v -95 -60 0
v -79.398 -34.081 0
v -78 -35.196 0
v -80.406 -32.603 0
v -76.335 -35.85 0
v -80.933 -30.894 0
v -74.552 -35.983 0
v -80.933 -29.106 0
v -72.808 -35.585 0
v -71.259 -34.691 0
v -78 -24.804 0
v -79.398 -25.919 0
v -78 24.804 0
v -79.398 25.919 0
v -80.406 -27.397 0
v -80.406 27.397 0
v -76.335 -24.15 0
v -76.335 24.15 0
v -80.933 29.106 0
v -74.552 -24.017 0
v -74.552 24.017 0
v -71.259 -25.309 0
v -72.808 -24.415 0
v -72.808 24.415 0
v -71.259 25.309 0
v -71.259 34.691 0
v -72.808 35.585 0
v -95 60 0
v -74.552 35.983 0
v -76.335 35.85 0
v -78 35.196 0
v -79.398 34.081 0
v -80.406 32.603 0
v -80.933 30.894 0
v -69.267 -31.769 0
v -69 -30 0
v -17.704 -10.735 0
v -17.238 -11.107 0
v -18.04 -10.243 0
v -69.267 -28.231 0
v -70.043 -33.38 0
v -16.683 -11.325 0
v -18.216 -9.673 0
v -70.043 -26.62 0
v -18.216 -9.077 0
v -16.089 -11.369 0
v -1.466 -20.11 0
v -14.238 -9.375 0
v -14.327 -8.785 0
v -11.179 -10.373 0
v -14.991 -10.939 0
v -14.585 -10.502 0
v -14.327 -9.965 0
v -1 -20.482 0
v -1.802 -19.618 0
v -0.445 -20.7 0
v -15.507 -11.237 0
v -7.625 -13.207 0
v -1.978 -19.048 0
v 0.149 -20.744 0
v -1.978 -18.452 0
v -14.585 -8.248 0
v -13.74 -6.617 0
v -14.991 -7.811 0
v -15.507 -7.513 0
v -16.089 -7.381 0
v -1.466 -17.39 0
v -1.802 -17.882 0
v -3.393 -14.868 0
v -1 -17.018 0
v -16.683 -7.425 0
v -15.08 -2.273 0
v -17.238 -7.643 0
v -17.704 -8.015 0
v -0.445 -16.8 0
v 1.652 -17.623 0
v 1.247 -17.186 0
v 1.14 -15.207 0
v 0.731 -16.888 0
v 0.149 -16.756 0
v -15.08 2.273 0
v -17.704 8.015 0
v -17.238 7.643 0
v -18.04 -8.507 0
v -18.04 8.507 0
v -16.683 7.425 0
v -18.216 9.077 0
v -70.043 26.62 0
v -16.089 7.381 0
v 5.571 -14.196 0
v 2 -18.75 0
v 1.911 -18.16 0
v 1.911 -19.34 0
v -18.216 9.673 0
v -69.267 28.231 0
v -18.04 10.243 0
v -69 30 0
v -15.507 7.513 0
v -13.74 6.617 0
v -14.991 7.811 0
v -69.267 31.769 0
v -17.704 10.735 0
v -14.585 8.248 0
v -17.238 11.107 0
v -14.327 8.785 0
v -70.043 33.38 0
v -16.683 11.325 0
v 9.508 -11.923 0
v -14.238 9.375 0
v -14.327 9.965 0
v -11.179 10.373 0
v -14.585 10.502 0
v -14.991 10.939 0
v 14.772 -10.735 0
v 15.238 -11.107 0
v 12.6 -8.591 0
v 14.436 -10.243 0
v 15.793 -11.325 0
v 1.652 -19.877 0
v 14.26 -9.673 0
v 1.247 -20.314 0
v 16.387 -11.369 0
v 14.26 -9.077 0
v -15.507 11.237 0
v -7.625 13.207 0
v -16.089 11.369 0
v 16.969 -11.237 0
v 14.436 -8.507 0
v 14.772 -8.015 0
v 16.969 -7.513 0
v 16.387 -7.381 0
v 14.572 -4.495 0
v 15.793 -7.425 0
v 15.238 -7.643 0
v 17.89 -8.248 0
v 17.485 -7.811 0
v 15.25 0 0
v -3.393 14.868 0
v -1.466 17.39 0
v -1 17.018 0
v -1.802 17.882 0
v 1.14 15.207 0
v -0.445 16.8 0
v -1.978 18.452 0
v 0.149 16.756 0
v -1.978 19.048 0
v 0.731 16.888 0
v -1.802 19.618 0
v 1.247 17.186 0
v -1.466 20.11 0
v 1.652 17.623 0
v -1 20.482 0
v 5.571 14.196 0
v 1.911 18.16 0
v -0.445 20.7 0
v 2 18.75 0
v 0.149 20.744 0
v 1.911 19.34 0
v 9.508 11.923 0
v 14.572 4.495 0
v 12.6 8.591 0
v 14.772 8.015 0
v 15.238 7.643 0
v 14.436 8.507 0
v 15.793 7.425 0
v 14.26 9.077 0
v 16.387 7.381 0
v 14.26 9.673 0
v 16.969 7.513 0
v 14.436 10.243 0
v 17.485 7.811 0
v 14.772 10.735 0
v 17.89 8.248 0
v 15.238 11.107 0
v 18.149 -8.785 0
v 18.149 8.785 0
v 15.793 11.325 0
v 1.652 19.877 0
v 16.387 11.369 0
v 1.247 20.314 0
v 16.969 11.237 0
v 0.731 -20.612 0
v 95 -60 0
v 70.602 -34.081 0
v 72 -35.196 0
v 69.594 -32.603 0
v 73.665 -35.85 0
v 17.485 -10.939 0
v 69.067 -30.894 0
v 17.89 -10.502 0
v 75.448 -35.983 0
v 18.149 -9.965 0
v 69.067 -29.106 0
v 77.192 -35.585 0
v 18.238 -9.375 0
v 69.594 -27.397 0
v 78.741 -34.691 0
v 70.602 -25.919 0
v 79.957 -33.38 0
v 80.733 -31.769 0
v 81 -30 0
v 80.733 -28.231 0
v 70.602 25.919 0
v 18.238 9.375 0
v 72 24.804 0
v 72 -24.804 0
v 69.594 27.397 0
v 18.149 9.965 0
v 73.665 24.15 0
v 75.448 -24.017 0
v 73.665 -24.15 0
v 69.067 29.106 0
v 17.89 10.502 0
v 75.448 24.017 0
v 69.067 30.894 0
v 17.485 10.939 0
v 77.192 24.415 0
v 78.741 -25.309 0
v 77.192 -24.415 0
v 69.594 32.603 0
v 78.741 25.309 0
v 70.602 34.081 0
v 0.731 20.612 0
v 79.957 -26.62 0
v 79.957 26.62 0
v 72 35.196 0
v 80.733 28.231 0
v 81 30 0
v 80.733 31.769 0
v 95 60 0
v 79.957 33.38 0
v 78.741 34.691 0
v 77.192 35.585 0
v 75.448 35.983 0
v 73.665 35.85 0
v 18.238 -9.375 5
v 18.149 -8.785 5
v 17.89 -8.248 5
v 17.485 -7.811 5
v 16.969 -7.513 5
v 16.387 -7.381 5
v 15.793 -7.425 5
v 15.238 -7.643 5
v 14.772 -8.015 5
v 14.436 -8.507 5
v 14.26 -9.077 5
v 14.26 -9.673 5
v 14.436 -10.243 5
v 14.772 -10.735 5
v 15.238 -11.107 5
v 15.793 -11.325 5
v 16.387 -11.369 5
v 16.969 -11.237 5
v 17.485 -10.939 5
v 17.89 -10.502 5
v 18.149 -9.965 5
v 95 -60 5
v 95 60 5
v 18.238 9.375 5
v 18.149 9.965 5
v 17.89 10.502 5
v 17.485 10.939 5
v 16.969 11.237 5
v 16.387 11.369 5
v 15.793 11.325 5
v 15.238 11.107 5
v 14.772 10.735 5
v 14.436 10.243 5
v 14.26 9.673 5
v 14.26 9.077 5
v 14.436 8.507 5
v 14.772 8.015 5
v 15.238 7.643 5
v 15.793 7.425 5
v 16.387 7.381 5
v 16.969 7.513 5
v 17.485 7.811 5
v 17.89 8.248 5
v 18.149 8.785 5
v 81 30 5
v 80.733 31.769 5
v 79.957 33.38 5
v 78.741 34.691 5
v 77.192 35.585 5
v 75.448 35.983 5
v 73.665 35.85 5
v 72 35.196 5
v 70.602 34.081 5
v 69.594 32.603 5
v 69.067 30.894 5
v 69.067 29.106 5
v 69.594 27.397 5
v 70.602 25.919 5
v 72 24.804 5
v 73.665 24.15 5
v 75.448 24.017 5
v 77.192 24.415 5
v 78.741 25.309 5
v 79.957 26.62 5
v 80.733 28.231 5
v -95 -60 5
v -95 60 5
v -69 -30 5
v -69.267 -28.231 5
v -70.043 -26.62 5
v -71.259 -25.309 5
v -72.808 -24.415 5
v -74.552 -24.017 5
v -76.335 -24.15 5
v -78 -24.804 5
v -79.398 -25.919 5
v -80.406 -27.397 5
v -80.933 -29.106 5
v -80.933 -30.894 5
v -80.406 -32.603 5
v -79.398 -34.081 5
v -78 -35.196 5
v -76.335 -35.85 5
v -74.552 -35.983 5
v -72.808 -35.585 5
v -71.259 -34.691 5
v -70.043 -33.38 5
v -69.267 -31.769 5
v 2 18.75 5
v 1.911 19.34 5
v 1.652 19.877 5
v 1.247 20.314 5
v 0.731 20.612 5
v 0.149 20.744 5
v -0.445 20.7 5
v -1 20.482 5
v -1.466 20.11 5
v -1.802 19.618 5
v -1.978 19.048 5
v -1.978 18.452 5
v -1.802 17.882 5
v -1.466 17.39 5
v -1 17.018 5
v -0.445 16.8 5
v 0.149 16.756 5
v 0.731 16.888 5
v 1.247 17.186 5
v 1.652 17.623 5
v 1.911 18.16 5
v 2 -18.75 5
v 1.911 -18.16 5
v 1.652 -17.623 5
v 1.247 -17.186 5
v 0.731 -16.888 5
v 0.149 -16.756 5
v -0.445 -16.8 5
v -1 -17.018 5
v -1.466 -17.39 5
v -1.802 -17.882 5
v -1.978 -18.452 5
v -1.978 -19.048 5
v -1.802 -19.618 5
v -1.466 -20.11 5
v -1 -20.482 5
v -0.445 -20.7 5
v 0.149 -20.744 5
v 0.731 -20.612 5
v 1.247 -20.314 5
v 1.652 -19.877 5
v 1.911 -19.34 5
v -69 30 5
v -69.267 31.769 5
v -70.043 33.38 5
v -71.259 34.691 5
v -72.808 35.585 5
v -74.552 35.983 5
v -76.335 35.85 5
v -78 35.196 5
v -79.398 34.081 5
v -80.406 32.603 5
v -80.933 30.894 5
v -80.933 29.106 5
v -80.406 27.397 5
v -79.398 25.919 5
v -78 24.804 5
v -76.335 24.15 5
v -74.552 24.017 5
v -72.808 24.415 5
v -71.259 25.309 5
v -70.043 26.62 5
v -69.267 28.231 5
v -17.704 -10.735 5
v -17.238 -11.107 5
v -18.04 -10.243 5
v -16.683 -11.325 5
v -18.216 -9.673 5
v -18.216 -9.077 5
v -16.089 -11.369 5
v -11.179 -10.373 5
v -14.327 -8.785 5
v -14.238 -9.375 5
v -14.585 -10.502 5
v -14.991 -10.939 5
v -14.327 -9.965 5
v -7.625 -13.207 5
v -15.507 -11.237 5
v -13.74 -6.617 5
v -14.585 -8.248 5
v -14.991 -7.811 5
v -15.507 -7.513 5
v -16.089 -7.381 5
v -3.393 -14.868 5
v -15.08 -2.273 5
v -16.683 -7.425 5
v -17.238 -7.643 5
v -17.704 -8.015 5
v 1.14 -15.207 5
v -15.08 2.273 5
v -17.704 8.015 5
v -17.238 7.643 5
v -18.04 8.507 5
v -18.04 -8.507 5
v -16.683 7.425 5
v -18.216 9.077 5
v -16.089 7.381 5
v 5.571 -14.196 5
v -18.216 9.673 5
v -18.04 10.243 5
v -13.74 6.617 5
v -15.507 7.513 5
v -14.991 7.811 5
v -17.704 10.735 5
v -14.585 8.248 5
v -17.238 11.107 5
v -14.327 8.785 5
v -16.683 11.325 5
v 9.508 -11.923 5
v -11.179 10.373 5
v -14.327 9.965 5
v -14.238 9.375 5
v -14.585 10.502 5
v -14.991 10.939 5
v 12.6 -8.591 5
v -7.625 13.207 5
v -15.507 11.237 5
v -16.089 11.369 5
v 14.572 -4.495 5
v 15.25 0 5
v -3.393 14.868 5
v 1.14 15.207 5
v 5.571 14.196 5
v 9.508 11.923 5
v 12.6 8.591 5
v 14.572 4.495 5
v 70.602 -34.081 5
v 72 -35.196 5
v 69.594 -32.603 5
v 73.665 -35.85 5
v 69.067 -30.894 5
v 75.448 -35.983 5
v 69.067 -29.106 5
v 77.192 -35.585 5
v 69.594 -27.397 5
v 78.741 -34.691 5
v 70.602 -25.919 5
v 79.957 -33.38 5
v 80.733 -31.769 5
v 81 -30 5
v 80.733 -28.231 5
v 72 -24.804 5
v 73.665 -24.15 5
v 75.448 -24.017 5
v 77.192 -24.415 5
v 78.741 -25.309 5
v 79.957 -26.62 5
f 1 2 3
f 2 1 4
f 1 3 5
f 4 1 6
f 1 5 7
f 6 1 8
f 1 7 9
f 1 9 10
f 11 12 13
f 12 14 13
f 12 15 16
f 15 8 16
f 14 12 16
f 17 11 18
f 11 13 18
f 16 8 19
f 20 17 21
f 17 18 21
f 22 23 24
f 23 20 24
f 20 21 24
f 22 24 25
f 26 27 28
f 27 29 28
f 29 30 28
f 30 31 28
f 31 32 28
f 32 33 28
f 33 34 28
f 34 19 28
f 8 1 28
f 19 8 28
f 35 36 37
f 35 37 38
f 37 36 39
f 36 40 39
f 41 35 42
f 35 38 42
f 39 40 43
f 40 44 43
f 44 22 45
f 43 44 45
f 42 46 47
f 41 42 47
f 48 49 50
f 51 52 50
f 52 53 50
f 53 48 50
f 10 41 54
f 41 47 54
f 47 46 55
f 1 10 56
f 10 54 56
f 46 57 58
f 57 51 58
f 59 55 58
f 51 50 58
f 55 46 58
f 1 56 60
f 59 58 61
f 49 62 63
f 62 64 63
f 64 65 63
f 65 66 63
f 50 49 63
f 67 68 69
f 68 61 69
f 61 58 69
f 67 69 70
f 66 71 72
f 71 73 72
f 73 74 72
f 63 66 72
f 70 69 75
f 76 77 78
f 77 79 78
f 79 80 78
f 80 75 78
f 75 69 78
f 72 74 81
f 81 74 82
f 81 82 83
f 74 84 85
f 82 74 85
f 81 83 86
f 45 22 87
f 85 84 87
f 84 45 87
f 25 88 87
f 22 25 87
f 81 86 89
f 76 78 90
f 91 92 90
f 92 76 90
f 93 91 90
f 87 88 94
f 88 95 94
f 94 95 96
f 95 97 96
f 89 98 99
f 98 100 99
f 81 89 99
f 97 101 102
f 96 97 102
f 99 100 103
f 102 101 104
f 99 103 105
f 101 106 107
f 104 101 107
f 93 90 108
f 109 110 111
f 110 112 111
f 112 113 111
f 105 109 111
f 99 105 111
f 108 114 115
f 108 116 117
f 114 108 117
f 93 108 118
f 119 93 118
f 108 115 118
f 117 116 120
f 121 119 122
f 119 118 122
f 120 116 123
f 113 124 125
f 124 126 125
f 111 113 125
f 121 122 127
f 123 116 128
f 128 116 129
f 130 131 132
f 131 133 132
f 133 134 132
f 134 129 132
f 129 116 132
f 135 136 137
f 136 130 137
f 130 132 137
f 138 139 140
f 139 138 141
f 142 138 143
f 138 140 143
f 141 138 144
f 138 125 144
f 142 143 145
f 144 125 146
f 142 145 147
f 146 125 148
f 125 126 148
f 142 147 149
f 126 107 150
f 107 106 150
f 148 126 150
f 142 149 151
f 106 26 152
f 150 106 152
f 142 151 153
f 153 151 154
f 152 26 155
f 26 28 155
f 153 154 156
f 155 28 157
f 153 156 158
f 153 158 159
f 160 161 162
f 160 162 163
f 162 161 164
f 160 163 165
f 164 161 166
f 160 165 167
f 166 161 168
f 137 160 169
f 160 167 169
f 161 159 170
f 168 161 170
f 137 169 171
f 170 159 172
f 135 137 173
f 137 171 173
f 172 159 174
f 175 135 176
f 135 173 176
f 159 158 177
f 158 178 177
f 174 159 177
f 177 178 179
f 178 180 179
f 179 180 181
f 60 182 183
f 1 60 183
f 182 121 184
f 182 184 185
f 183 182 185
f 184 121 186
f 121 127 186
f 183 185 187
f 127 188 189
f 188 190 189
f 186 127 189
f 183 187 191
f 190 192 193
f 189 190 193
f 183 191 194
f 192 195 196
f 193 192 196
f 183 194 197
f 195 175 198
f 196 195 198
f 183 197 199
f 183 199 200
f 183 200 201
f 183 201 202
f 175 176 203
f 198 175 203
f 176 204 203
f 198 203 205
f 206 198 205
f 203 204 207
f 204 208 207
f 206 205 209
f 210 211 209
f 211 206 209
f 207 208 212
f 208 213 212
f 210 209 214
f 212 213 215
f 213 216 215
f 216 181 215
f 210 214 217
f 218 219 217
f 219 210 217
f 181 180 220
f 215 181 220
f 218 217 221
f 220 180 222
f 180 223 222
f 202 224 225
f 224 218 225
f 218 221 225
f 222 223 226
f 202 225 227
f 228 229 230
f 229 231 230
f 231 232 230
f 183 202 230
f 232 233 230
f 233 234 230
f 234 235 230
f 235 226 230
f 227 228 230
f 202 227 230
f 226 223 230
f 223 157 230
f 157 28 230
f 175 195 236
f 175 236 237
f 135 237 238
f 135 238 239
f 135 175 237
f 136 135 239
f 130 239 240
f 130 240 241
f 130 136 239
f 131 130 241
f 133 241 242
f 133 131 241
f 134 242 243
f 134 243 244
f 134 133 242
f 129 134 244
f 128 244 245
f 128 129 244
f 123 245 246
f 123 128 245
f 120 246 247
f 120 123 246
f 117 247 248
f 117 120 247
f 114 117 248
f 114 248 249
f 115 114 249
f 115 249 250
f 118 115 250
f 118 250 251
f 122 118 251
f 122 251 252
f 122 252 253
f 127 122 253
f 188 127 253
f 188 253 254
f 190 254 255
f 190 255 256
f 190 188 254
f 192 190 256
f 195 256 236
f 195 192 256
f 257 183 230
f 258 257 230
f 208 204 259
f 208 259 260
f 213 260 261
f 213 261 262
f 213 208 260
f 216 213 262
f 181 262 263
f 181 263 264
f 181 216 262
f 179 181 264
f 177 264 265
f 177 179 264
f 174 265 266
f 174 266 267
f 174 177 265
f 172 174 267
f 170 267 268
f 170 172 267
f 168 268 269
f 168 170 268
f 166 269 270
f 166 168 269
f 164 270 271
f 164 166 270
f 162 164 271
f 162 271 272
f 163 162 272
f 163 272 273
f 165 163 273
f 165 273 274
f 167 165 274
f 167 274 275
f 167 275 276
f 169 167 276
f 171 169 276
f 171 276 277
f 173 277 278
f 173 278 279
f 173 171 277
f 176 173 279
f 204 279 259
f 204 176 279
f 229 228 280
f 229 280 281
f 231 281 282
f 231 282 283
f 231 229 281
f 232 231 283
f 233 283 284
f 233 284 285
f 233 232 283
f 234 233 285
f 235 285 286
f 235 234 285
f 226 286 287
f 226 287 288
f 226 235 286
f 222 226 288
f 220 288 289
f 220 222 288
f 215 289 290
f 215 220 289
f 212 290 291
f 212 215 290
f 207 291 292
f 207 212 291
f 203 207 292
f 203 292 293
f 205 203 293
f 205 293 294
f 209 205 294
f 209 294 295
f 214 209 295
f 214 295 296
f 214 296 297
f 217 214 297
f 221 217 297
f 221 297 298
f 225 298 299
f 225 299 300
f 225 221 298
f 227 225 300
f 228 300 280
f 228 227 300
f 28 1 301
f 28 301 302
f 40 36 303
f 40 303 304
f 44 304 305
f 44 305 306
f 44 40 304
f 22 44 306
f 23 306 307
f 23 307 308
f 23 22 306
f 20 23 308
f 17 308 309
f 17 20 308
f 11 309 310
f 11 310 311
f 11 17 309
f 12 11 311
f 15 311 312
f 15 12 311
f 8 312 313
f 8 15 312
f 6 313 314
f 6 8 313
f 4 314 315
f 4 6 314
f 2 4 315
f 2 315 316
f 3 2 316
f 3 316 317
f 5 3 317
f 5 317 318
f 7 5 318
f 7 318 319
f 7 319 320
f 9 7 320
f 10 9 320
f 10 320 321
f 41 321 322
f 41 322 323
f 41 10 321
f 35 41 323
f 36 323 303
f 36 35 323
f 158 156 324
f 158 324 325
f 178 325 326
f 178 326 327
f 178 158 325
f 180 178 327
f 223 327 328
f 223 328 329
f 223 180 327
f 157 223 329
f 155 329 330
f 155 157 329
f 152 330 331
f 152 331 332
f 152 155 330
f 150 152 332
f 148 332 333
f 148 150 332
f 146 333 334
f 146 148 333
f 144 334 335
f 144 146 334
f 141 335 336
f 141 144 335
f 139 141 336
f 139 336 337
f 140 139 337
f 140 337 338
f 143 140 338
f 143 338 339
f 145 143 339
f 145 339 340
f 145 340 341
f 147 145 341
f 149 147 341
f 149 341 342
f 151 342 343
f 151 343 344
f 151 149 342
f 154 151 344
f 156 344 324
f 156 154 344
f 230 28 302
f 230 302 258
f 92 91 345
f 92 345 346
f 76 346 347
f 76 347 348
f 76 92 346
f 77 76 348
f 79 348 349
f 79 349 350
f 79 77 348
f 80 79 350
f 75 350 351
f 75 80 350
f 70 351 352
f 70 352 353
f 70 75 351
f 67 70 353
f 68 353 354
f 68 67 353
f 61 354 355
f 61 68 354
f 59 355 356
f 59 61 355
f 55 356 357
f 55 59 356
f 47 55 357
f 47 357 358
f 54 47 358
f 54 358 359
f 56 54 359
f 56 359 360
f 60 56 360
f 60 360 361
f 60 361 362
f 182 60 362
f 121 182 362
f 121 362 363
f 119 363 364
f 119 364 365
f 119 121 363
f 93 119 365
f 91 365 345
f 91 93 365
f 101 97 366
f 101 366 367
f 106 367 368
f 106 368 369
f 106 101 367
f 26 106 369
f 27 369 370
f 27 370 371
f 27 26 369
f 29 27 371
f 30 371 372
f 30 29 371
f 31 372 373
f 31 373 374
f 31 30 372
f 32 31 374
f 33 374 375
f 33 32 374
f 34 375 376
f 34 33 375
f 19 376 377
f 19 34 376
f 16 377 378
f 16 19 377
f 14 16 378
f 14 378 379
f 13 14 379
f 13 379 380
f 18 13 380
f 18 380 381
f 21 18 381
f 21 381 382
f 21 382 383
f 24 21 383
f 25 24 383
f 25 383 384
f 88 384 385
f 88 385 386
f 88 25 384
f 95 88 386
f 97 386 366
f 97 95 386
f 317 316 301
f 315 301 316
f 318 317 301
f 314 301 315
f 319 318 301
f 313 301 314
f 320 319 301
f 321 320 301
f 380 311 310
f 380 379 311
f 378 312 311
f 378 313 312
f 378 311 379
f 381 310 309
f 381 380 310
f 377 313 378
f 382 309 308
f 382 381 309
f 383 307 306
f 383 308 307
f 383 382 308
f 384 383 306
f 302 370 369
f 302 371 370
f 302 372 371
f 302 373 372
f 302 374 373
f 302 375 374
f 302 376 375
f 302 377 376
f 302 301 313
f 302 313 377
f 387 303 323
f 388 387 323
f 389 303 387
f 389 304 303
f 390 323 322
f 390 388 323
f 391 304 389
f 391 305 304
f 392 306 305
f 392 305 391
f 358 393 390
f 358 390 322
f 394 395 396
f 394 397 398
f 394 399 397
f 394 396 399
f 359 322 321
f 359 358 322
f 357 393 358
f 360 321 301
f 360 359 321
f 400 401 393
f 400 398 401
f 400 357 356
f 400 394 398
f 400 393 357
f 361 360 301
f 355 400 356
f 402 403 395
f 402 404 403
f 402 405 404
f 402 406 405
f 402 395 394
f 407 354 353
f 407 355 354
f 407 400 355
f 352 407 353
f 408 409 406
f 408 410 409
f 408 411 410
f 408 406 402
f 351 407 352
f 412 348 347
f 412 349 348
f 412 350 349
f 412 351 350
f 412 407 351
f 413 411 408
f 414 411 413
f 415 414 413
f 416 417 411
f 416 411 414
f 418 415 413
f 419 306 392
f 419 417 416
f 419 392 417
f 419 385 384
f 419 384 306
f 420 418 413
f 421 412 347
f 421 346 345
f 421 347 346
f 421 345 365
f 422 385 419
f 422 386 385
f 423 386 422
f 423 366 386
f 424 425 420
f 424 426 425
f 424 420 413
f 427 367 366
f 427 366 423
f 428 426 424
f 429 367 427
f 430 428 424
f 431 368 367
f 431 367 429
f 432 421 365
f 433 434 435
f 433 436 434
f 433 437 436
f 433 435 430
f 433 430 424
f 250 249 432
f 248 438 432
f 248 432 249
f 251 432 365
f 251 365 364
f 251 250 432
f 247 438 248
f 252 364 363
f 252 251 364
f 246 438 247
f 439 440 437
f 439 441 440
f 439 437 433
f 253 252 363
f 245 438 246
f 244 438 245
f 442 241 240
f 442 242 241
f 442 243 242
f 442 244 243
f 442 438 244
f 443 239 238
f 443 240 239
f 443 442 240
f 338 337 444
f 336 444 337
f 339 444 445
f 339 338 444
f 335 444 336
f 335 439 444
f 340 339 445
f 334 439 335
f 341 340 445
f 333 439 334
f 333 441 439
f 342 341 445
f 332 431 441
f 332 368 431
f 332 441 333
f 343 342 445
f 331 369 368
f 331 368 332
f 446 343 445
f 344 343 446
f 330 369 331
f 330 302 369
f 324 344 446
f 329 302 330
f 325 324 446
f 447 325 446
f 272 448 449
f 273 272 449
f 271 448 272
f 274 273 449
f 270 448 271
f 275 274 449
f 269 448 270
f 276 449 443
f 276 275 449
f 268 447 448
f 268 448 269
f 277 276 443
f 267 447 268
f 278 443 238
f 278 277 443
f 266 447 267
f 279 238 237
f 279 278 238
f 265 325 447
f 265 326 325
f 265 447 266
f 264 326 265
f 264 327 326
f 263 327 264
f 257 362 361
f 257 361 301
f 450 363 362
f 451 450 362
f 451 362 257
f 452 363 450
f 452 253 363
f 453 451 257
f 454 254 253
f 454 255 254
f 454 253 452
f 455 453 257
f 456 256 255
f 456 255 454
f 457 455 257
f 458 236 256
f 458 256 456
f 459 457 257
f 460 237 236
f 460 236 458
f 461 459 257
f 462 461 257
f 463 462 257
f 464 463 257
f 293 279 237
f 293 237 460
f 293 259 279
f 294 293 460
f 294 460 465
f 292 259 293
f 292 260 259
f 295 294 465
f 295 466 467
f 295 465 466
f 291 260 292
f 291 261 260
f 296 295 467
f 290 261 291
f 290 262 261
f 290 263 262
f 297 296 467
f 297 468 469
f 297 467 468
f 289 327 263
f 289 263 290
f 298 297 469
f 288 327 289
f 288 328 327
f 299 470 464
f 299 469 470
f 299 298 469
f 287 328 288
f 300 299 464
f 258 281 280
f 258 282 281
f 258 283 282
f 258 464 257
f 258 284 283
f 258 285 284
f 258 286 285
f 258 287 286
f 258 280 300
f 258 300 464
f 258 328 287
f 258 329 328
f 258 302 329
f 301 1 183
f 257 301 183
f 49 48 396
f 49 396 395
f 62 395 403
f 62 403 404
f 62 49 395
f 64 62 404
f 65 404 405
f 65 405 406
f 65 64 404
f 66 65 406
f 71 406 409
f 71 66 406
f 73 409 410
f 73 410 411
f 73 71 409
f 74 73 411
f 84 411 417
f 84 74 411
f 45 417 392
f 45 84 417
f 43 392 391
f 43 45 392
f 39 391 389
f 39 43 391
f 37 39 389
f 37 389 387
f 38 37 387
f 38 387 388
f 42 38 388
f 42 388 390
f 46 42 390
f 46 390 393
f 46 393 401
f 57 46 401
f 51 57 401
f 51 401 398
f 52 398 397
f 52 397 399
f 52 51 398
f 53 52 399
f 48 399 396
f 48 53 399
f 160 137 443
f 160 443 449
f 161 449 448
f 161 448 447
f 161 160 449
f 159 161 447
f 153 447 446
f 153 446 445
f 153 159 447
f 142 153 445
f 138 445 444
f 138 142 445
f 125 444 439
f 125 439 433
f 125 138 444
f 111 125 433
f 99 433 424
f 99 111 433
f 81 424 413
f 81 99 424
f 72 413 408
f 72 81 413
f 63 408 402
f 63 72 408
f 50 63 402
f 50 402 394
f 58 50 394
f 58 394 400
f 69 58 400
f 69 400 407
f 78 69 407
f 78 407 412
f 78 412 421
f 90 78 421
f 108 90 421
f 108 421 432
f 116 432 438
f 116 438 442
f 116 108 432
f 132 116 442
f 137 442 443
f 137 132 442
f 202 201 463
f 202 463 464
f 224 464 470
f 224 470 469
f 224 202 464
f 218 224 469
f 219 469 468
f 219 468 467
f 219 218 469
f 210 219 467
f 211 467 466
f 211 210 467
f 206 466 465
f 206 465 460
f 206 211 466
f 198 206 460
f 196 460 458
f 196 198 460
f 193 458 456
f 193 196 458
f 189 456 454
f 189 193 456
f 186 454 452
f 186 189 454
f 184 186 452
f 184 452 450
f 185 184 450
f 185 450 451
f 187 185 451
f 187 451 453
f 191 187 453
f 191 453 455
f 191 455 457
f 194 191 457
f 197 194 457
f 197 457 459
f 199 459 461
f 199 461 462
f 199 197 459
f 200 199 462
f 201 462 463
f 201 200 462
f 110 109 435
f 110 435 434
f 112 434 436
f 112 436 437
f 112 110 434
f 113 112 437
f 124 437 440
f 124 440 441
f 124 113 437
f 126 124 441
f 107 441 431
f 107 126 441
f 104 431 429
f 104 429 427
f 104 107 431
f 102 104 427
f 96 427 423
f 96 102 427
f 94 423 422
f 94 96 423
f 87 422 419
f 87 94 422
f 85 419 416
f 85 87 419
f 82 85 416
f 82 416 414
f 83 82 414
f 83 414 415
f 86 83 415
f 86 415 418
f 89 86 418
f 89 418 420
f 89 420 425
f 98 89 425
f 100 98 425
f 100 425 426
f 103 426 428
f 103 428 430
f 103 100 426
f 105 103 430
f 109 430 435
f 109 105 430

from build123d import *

# Parameters (mm, degrees)
SKETCH1_W           = 190
SKETCH1_H           = 120
SKETCH1_R           = 6
SKETCH1_R_2         = 15.25
SKETCH1_R_3         = 2
BOSS_EXTRUDE1_DEPTH = 5


with BuildPart() as part:
    # Sketch1 → Boss-Extrude1 (new body)
    with BuildSketch(Plane.XY):
        Rectangle(SKETCH1_W, SKETCH1_H)
        with Locations((-75, 30)):
            Circle(SKETCH1_R, mode=Mode.SUBTRACT)
        with Locations((75, 30)):
            Circle(SKETCH1_R, mode=Mode.SUBTRACT)
        with Locations((75, -30)):
            Circle(SKETCH1_R, mode=Mode.SUBTRACT)
        with Locations((-75, -30)):
            Circle(SKETCH1_R, mode=Mode.SUBTRACT)
        Circle(SKETCH1_R_2, mode=Mode.SUBTRACT)
        with Locations((0, 18.75)):
            Circle(SKETCH1_R_3, mode=Mode.SUBTRACT)
        with Locations((16.237976321, 9.375)):
            Circle(SKETCH1_R_3, mode=Mode.SUBTRACT)
        with Locations((16.237976321, -9.375)):
            Circle(SKETCH1_R_3, mode=Mode.SUBTRACT)
        with Locations((0, -18.75)):
            Circle(SKETCH1_R_3, mode=Mode.SUBTRACT)
        with Locations((-16.237976321, -9.375)):
            Circle(SKETCH1_R_3, mode=Mode.SUBTRACT)
        with Locations((-16.237976321, 9.375)):
            Circle(SKETCH1_R_3, mode=Mode.SUBTRACT)
    extrude(amount=BOSS_EXTRUDE1_DEPTH)


solid = part.part
